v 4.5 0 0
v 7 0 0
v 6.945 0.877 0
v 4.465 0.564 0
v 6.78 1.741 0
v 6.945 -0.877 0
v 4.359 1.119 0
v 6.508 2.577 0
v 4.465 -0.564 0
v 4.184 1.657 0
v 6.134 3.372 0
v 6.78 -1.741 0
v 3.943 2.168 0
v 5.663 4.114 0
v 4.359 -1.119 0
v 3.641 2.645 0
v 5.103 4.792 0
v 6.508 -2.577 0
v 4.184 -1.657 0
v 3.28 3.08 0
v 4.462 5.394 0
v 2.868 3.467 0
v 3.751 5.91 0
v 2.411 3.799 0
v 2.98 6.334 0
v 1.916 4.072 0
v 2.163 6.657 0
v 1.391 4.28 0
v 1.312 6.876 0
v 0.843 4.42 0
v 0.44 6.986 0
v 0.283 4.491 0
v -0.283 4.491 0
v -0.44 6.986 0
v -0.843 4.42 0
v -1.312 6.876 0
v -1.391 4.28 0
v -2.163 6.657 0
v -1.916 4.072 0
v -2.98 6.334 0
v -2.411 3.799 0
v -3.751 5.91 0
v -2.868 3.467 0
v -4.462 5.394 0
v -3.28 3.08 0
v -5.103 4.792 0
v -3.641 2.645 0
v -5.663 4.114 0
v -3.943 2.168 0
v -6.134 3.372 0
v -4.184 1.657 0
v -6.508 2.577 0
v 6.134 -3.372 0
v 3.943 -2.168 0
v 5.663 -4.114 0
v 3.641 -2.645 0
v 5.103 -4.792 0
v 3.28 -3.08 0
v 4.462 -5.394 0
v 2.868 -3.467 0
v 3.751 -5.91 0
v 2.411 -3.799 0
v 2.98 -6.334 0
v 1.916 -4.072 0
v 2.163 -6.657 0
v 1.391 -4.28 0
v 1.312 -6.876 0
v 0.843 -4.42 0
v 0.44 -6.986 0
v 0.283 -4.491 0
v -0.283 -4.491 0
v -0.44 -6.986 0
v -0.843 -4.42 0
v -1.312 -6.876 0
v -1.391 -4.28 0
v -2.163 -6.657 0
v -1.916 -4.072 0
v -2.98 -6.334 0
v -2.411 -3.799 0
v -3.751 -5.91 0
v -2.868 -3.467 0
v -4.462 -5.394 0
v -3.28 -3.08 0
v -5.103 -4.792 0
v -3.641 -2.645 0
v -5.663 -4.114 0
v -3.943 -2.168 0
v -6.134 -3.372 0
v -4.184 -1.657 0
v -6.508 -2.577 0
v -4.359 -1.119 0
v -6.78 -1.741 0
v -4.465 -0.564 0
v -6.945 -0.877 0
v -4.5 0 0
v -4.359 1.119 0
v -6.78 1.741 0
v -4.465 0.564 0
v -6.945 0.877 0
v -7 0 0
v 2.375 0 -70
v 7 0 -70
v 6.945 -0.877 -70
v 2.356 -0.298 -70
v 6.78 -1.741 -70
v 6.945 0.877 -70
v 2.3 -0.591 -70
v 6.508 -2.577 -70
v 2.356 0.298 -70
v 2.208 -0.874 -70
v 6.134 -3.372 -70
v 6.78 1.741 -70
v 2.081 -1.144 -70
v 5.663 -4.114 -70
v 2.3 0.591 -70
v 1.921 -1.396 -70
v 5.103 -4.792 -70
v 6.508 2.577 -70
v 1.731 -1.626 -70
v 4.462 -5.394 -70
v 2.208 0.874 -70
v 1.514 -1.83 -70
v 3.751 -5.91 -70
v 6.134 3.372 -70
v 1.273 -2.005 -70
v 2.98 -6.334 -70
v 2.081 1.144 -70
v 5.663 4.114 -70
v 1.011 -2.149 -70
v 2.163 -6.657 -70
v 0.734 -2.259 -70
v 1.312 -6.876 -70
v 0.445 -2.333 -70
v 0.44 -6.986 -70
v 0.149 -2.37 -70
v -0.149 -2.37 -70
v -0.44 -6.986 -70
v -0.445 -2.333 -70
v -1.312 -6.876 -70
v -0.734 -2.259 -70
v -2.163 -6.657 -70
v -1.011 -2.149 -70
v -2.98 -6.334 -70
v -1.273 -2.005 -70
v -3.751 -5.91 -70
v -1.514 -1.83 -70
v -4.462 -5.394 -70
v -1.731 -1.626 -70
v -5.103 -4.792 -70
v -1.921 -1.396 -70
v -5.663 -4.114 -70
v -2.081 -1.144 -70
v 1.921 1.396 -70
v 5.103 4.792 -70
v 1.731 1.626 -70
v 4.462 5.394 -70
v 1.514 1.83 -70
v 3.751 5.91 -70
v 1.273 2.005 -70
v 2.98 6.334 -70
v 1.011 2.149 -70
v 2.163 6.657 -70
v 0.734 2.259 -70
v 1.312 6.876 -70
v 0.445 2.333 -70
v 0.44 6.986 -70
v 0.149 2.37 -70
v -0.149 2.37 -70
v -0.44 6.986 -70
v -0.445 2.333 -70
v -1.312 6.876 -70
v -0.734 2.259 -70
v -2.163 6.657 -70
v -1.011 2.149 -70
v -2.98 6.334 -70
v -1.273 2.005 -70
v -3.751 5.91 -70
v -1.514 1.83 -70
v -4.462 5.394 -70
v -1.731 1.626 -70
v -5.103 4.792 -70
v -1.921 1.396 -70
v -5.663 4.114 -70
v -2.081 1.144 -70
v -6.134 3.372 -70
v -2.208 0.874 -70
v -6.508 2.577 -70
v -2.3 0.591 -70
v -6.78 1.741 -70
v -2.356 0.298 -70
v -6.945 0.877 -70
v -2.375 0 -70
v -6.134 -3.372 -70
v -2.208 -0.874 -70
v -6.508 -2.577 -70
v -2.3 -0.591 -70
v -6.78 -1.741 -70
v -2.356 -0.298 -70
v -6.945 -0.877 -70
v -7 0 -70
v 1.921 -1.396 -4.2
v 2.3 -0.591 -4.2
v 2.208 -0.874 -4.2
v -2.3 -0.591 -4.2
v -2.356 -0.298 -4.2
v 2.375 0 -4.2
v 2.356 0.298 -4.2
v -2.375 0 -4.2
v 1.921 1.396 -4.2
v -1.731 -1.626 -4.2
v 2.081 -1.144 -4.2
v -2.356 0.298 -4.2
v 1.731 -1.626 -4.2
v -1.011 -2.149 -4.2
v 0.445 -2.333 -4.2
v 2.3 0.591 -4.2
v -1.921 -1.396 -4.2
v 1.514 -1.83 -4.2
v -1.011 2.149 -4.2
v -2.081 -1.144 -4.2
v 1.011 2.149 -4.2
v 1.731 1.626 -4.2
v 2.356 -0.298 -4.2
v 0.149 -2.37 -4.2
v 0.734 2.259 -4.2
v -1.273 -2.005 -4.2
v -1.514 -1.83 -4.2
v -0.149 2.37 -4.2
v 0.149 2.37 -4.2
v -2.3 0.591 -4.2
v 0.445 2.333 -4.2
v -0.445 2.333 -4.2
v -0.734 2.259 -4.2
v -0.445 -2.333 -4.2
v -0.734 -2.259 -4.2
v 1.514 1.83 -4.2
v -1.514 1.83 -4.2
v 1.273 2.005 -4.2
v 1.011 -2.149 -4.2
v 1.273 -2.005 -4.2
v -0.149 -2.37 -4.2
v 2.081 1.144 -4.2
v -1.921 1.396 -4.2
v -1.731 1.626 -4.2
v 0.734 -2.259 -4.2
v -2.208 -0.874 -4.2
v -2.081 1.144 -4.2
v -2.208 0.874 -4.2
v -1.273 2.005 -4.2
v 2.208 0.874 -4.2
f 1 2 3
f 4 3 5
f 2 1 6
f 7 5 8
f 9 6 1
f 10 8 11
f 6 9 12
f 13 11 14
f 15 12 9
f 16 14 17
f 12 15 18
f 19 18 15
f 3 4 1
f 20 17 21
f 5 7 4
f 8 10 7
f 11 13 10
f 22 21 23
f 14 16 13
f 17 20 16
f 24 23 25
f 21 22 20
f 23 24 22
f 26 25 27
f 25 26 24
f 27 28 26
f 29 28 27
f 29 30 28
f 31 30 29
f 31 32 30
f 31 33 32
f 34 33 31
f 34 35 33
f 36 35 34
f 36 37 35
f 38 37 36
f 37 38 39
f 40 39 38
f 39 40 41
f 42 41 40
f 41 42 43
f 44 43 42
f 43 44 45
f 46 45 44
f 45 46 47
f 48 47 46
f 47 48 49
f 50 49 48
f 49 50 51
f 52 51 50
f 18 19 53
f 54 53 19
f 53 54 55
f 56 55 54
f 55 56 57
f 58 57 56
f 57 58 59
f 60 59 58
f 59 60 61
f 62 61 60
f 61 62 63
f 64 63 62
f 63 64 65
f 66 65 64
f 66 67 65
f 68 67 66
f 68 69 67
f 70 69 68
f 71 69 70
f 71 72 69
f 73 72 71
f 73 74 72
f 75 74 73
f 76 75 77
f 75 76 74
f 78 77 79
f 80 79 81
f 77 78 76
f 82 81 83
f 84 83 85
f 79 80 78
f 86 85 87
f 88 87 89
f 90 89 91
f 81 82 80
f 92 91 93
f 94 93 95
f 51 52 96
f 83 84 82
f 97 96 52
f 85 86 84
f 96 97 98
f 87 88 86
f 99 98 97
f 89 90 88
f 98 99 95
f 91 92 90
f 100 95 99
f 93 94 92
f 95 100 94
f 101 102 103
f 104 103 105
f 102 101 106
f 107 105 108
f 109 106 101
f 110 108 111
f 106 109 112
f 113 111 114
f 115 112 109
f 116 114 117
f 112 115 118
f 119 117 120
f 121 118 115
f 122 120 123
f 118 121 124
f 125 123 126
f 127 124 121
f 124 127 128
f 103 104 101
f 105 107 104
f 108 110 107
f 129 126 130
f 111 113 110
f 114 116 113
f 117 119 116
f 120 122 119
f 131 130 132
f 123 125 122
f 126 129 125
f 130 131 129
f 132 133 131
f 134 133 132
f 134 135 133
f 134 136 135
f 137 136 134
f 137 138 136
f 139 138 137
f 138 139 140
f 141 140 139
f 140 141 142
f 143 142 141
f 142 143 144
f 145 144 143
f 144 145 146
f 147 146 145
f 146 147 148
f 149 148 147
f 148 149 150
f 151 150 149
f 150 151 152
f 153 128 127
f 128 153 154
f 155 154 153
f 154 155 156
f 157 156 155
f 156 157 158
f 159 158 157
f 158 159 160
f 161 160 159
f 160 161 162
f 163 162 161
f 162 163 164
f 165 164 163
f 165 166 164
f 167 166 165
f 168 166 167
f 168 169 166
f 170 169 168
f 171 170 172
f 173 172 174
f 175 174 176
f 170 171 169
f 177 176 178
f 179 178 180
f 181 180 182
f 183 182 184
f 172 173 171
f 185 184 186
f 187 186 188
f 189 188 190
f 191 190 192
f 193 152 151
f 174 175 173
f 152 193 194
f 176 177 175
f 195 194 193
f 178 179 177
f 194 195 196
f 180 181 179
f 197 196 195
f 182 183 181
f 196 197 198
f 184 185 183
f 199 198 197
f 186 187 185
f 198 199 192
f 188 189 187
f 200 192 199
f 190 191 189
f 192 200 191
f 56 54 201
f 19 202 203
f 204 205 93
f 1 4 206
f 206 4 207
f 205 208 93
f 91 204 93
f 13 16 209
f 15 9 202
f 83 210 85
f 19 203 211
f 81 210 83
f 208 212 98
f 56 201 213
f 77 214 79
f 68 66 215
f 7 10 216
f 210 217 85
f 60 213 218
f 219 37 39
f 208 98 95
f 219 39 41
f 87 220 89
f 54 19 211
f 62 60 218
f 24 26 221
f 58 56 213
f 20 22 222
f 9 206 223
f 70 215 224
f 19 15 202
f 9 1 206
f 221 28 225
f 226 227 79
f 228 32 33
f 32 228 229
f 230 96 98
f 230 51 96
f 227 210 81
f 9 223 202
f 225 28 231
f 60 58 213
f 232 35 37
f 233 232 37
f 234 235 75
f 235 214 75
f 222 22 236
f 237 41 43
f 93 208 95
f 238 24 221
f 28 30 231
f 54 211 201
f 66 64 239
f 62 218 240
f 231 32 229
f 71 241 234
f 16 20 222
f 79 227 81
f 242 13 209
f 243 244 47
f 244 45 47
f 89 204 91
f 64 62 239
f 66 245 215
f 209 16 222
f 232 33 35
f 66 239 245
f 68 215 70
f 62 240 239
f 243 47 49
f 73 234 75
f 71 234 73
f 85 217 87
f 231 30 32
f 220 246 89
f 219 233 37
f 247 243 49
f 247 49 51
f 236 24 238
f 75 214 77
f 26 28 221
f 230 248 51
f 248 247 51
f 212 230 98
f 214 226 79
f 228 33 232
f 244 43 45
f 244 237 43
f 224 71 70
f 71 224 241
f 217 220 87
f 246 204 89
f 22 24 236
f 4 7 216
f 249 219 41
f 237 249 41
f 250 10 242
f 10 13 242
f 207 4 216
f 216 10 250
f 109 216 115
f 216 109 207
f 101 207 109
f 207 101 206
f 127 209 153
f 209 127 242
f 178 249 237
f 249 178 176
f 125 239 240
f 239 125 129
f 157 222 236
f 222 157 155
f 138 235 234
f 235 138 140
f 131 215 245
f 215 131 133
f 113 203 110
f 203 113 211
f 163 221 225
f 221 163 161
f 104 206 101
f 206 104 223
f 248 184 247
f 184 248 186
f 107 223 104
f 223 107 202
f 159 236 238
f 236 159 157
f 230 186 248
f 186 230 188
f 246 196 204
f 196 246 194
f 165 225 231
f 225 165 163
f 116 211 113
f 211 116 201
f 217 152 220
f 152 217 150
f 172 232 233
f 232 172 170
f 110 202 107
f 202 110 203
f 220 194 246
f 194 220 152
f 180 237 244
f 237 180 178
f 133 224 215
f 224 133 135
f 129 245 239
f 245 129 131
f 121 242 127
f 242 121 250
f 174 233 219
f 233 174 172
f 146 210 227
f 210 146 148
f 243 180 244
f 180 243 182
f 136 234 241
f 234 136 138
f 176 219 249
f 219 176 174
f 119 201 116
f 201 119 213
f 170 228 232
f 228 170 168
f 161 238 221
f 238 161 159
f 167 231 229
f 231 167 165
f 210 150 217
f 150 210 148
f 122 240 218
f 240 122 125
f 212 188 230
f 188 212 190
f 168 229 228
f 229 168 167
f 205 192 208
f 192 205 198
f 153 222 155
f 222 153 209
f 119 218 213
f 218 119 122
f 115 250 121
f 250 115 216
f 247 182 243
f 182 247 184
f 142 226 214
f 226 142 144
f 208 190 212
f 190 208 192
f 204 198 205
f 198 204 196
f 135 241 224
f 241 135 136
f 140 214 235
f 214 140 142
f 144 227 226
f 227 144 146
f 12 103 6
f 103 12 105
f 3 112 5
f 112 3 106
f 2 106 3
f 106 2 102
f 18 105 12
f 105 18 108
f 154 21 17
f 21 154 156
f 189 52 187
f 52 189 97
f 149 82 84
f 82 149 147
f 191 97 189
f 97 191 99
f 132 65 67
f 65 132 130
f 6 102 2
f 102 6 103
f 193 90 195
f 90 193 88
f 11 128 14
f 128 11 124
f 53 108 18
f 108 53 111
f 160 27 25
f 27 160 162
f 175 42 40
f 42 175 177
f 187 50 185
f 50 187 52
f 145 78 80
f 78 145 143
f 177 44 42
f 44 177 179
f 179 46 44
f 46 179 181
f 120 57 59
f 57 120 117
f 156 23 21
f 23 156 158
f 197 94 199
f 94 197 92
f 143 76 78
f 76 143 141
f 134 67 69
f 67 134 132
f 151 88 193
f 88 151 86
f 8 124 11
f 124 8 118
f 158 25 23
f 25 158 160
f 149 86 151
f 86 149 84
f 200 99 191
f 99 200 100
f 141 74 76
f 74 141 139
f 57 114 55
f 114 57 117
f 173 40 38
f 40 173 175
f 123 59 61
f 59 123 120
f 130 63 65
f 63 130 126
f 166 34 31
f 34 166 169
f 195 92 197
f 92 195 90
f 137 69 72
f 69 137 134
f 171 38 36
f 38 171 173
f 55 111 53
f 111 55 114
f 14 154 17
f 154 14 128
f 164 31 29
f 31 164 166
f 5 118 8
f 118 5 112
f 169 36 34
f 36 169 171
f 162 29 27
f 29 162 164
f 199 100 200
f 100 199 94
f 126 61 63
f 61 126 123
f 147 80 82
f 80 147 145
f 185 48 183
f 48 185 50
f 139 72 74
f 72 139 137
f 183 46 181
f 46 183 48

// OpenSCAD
$fn = 50;


difference() {
	union() {
		translate(v = [0, 0, -70.0000000000]) {
			cylinder(h = 70, r = 7.0000000000);
		}
		cylinder(h = 0, r = 17.0000000000);
	}
	union() {
		translate(v = [0, 0, 0]) {
			rotate(a = [0, 0, 0]) {
				difference() {
					union() {
						#translate(v = [0, 0, -70.0000000000]) {
							cylinder(h = 70, r = 2.2500000000);
						}
						#translate(v = [0, 0, -4.2000000000]) {
							cylinder(h = 4.2000000000, r1 = 2.3750000000, r2 = 4.5000000000);
						}
						#translate(v = [0, 0, -70.0000000000]) {
							cylinder(h = 70, r = 2.3750000000);
						}
						#translate(v = [0, 0, -70.0000000000]) {
							cylinder(h = 70, r = 2.2500000000);
						}
					}
					union();
				}
			}
		}
	}
}
